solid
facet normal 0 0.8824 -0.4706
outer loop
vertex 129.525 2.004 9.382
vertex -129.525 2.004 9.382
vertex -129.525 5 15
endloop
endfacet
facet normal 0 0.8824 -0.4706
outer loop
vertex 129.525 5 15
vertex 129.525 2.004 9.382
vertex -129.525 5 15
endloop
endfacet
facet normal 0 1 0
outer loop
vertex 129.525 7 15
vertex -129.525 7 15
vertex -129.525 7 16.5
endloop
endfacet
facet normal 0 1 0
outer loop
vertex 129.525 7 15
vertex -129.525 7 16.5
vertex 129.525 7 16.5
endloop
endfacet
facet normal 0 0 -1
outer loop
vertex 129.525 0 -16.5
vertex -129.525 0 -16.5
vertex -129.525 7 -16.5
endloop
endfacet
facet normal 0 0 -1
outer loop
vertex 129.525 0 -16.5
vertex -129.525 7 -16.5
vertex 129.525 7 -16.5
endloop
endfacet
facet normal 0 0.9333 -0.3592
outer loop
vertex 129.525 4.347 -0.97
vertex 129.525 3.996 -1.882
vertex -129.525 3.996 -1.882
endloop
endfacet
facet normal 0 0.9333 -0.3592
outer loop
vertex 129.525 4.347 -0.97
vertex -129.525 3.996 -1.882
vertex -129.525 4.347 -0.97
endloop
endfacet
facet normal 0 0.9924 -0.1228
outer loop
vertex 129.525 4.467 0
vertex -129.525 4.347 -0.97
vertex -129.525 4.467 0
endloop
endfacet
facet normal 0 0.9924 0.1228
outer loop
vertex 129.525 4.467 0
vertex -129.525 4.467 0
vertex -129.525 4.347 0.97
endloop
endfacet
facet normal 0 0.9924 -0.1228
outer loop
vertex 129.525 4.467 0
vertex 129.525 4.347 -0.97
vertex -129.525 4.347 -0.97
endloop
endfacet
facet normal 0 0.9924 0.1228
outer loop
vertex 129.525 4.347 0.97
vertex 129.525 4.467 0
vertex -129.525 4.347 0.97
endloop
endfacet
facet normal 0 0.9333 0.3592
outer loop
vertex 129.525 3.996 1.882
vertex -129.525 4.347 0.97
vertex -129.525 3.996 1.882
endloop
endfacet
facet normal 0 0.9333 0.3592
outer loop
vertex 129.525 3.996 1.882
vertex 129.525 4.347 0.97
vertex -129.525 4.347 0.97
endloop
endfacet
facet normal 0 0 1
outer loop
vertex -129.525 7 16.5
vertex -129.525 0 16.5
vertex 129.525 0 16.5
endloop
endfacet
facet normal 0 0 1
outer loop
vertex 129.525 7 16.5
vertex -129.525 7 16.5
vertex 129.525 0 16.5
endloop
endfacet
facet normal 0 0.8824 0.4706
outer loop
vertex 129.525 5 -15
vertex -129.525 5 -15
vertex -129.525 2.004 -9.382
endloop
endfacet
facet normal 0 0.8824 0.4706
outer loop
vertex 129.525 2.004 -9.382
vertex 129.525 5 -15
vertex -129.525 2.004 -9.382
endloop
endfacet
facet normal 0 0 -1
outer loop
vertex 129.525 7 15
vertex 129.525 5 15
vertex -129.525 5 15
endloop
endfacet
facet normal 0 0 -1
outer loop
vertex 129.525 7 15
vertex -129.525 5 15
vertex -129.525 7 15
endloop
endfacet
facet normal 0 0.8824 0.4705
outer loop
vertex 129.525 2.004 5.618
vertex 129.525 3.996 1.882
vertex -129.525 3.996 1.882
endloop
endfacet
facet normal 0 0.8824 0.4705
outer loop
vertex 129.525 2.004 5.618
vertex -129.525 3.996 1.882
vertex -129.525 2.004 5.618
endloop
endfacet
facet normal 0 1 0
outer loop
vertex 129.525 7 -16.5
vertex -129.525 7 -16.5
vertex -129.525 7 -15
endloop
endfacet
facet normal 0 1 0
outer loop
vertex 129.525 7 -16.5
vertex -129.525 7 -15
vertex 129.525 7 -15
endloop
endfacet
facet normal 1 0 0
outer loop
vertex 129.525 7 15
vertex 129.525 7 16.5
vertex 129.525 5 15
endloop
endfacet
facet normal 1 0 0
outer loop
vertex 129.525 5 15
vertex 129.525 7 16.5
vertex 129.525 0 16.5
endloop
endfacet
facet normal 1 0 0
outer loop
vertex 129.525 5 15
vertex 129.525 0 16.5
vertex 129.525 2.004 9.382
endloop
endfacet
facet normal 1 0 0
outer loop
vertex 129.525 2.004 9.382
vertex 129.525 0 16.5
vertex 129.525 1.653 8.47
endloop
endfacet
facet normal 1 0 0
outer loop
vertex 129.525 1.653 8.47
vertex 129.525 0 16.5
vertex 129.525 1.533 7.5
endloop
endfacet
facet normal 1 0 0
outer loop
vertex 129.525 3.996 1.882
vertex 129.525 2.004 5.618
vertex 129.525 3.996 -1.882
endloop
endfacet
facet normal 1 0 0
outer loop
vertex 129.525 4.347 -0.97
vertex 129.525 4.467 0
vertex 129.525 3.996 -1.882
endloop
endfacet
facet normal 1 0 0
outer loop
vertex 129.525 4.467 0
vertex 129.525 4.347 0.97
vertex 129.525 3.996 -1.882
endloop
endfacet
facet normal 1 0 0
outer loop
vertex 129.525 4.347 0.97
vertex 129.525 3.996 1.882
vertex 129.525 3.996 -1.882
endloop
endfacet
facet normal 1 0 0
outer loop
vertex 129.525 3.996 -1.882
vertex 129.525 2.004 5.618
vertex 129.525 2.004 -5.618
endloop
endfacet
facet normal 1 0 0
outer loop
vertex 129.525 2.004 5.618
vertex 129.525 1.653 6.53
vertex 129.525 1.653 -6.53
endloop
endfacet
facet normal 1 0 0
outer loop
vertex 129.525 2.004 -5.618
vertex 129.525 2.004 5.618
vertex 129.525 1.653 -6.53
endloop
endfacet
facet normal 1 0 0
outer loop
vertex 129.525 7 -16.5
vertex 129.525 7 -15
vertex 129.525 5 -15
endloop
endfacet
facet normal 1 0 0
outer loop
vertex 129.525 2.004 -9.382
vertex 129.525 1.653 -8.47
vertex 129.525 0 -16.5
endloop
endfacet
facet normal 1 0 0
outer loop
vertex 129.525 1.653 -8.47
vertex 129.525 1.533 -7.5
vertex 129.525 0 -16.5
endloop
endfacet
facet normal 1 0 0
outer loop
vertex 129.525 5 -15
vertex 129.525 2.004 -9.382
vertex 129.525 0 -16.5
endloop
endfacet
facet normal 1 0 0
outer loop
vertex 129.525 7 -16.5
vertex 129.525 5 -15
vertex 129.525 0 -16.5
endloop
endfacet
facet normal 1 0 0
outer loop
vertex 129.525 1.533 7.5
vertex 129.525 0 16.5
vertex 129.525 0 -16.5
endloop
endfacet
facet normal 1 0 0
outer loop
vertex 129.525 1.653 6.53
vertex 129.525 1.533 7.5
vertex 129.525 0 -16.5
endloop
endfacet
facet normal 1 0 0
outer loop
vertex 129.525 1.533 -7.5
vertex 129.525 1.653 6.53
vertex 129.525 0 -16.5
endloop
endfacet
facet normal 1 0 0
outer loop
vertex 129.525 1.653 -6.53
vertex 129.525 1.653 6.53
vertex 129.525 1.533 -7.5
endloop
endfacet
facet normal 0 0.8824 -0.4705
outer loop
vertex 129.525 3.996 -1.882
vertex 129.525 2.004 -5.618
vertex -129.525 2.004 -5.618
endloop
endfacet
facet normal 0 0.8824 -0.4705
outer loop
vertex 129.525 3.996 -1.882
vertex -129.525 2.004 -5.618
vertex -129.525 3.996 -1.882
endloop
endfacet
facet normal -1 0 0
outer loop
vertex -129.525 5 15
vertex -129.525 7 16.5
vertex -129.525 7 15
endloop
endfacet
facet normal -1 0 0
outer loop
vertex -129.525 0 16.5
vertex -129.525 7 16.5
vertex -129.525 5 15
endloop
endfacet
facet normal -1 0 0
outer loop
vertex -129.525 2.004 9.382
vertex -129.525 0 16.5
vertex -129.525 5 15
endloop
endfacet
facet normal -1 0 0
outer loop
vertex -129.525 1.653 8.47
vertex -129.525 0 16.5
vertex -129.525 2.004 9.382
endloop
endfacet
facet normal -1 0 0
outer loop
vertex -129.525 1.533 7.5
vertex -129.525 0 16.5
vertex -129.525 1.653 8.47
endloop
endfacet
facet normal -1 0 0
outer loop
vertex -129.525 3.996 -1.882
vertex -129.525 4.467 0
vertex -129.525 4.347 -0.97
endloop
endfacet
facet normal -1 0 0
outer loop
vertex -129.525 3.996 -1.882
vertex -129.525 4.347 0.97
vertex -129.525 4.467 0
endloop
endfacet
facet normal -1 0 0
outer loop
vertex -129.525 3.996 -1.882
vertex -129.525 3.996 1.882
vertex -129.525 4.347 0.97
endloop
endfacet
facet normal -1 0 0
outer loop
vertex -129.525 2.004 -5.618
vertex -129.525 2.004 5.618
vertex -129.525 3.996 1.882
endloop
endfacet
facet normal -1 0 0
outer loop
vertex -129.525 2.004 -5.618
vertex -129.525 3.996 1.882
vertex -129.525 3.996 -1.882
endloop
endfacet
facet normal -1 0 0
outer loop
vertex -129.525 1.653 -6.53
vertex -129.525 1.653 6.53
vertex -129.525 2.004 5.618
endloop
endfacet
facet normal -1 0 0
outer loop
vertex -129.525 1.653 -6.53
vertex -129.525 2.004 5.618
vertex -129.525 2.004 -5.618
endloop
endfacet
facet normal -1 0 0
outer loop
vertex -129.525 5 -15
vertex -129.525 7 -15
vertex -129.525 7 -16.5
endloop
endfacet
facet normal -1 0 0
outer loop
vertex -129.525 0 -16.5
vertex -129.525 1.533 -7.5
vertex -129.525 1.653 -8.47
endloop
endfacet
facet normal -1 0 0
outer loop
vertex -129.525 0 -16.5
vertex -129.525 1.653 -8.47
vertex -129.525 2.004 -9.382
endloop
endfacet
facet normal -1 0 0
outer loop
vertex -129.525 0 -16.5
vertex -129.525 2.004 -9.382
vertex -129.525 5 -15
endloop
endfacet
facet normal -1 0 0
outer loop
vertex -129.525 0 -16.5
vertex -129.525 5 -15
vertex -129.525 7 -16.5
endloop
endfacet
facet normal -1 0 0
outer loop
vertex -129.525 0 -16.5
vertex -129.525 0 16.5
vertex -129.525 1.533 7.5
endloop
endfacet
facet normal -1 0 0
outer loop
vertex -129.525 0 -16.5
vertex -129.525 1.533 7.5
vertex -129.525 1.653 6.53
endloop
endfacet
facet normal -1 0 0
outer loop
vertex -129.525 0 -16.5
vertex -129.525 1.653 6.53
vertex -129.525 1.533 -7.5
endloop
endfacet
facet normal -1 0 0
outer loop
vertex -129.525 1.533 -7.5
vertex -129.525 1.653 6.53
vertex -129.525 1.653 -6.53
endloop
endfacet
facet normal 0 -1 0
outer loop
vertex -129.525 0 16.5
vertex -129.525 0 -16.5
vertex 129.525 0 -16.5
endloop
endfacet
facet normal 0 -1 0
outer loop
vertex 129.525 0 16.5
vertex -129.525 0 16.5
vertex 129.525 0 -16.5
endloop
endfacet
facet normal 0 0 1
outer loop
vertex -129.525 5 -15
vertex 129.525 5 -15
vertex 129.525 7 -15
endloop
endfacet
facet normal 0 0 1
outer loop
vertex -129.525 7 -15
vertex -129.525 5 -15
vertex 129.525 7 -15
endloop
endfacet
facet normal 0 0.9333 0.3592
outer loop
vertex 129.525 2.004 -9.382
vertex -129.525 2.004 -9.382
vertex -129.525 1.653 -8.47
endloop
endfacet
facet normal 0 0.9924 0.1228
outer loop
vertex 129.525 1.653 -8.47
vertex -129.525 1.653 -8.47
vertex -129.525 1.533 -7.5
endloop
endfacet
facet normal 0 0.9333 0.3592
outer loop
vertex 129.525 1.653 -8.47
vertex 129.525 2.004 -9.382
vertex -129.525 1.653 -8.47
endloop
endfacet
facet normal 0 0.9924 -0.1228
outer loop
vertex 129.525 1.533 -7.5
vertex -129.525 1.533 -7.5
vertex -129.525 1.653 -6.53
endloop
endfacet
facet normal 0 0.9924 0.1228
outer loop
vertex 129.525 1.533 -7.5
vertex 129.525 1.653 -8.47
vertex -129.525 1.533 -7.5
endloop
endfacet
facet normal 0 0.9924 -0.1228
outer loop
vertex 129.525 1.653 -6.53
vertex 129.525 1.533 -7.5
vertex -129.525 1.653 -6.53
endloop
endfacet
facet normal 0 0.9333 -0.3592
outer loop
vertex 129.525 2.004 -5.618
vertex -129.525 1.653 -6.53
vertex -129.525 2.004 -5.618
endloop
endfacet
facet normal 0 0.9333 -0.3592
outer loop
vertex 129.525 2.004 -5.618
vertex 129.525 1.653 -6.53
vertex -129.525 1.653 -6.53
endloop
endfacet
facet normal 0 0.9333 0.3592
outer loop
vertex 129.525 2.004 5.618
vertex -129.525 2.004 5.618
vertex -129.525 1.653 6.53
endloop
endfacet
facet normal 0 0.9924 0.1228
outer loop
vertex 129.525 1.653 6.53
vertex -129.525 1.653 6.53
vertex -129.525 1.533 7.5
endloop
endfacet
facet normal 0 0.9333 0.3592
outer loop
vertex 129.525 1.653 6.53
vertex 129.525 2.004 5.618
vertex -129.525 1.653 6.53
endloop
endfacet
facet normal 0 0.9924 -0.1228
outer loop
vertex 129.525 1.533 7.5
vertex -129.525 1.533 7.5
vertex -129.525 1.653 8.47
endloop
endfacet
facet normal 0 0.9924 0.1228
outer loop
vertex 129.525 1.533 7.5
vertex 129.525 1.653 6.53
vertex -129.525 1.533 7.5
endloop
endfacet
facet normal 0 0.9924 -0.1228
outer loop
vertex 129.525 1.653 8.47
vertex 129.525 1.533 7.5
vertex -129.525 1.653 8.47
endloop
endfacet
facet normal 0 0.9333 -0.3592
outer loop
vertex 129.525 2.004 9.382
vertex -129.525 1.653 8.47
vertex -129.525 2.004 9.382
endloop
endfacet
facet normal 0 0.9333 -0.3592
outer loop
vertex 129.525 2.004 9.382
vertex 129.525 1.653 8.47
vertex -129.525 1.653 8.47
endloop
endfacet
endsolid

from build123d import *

# Parameters (mm, degrees)
IZIM1_W                     = 259.05
IZIM1_H                     = 33
Y_KSEKLIK_EKSTR_ZYON1_DEPTH = 7
IZIM2_W                     = 30
IZIM2_H                     = 2
KES_EKSTR_ZYON1_DEPTH       = 291
KES_EKSTR_ZYON2_DEPTH       = 291


with BuildPart() as part:
    # Çizim1 → Yükseklik-Ekstrüzyon1 (new body)
    with BuildSketch(Plane(origin=(0, 0, 0), x_dir=(1, 0, 0), z_dir=(0, 1, 0))):
        Rectangle(IZIM1_W, IZIM1_H)
    extrude(amount=Y_KSEKLIK_EKSTR_ZYON1_DEPTH)

    # Çizim2 → Kes-Ekstrüzyon1 (cut)
    with BuildSketch(Plane(origin=(129.525, 0, 0), x_dir=(0, 0, -1), z_dir=(1, 0, 0))):
        with Locations((0, 6)):
            Rectangle(IZIM2_W, IZIM2_H)
    extrude(amount=-KES_EKSTR_ZYON1_DEPTH, mode=Mode.SUBTRACT)

    # Çizim3 → Kes-Ekstrüzyon2 (cut)
    with BuildSketch(Plane(origin=(129.525, 0, 0), x_dir=(0, 0, -1), z_dir=(1, 0, 0))):
        with BuildLine():
            Line((-15, 5), (15, 5))
            Line((15, 5), (9.382352941, 2.003921569))
            ThreePointArc((9.382352941, 2.003921569), (7.5, 1.533333333), (5.617647059, 2.003921569))
            Line((5.617647059, 2.003921569), (1.882352941, 3.996078431))
            ThreePointArc((1.882352941, 3.996078431), (0, 4.466666667), (-1.882352941, 3.996078431))
            Line((-1.882352941, 3.996078431), (-5.617647059, 2.003921569))
            ThreePointArc((-5.617647059, 2.003921569), (-7.5, 1.533333333), (-9.382352941, 2.003921569))
            Line((-9.382352941, 2.003921569), (-15, 5))
        make_face()
    extrude(amount=-KES_EKSTR_ZYON2_DEPTH, mode=Mode.SUBTRACT)


solid = part.part
